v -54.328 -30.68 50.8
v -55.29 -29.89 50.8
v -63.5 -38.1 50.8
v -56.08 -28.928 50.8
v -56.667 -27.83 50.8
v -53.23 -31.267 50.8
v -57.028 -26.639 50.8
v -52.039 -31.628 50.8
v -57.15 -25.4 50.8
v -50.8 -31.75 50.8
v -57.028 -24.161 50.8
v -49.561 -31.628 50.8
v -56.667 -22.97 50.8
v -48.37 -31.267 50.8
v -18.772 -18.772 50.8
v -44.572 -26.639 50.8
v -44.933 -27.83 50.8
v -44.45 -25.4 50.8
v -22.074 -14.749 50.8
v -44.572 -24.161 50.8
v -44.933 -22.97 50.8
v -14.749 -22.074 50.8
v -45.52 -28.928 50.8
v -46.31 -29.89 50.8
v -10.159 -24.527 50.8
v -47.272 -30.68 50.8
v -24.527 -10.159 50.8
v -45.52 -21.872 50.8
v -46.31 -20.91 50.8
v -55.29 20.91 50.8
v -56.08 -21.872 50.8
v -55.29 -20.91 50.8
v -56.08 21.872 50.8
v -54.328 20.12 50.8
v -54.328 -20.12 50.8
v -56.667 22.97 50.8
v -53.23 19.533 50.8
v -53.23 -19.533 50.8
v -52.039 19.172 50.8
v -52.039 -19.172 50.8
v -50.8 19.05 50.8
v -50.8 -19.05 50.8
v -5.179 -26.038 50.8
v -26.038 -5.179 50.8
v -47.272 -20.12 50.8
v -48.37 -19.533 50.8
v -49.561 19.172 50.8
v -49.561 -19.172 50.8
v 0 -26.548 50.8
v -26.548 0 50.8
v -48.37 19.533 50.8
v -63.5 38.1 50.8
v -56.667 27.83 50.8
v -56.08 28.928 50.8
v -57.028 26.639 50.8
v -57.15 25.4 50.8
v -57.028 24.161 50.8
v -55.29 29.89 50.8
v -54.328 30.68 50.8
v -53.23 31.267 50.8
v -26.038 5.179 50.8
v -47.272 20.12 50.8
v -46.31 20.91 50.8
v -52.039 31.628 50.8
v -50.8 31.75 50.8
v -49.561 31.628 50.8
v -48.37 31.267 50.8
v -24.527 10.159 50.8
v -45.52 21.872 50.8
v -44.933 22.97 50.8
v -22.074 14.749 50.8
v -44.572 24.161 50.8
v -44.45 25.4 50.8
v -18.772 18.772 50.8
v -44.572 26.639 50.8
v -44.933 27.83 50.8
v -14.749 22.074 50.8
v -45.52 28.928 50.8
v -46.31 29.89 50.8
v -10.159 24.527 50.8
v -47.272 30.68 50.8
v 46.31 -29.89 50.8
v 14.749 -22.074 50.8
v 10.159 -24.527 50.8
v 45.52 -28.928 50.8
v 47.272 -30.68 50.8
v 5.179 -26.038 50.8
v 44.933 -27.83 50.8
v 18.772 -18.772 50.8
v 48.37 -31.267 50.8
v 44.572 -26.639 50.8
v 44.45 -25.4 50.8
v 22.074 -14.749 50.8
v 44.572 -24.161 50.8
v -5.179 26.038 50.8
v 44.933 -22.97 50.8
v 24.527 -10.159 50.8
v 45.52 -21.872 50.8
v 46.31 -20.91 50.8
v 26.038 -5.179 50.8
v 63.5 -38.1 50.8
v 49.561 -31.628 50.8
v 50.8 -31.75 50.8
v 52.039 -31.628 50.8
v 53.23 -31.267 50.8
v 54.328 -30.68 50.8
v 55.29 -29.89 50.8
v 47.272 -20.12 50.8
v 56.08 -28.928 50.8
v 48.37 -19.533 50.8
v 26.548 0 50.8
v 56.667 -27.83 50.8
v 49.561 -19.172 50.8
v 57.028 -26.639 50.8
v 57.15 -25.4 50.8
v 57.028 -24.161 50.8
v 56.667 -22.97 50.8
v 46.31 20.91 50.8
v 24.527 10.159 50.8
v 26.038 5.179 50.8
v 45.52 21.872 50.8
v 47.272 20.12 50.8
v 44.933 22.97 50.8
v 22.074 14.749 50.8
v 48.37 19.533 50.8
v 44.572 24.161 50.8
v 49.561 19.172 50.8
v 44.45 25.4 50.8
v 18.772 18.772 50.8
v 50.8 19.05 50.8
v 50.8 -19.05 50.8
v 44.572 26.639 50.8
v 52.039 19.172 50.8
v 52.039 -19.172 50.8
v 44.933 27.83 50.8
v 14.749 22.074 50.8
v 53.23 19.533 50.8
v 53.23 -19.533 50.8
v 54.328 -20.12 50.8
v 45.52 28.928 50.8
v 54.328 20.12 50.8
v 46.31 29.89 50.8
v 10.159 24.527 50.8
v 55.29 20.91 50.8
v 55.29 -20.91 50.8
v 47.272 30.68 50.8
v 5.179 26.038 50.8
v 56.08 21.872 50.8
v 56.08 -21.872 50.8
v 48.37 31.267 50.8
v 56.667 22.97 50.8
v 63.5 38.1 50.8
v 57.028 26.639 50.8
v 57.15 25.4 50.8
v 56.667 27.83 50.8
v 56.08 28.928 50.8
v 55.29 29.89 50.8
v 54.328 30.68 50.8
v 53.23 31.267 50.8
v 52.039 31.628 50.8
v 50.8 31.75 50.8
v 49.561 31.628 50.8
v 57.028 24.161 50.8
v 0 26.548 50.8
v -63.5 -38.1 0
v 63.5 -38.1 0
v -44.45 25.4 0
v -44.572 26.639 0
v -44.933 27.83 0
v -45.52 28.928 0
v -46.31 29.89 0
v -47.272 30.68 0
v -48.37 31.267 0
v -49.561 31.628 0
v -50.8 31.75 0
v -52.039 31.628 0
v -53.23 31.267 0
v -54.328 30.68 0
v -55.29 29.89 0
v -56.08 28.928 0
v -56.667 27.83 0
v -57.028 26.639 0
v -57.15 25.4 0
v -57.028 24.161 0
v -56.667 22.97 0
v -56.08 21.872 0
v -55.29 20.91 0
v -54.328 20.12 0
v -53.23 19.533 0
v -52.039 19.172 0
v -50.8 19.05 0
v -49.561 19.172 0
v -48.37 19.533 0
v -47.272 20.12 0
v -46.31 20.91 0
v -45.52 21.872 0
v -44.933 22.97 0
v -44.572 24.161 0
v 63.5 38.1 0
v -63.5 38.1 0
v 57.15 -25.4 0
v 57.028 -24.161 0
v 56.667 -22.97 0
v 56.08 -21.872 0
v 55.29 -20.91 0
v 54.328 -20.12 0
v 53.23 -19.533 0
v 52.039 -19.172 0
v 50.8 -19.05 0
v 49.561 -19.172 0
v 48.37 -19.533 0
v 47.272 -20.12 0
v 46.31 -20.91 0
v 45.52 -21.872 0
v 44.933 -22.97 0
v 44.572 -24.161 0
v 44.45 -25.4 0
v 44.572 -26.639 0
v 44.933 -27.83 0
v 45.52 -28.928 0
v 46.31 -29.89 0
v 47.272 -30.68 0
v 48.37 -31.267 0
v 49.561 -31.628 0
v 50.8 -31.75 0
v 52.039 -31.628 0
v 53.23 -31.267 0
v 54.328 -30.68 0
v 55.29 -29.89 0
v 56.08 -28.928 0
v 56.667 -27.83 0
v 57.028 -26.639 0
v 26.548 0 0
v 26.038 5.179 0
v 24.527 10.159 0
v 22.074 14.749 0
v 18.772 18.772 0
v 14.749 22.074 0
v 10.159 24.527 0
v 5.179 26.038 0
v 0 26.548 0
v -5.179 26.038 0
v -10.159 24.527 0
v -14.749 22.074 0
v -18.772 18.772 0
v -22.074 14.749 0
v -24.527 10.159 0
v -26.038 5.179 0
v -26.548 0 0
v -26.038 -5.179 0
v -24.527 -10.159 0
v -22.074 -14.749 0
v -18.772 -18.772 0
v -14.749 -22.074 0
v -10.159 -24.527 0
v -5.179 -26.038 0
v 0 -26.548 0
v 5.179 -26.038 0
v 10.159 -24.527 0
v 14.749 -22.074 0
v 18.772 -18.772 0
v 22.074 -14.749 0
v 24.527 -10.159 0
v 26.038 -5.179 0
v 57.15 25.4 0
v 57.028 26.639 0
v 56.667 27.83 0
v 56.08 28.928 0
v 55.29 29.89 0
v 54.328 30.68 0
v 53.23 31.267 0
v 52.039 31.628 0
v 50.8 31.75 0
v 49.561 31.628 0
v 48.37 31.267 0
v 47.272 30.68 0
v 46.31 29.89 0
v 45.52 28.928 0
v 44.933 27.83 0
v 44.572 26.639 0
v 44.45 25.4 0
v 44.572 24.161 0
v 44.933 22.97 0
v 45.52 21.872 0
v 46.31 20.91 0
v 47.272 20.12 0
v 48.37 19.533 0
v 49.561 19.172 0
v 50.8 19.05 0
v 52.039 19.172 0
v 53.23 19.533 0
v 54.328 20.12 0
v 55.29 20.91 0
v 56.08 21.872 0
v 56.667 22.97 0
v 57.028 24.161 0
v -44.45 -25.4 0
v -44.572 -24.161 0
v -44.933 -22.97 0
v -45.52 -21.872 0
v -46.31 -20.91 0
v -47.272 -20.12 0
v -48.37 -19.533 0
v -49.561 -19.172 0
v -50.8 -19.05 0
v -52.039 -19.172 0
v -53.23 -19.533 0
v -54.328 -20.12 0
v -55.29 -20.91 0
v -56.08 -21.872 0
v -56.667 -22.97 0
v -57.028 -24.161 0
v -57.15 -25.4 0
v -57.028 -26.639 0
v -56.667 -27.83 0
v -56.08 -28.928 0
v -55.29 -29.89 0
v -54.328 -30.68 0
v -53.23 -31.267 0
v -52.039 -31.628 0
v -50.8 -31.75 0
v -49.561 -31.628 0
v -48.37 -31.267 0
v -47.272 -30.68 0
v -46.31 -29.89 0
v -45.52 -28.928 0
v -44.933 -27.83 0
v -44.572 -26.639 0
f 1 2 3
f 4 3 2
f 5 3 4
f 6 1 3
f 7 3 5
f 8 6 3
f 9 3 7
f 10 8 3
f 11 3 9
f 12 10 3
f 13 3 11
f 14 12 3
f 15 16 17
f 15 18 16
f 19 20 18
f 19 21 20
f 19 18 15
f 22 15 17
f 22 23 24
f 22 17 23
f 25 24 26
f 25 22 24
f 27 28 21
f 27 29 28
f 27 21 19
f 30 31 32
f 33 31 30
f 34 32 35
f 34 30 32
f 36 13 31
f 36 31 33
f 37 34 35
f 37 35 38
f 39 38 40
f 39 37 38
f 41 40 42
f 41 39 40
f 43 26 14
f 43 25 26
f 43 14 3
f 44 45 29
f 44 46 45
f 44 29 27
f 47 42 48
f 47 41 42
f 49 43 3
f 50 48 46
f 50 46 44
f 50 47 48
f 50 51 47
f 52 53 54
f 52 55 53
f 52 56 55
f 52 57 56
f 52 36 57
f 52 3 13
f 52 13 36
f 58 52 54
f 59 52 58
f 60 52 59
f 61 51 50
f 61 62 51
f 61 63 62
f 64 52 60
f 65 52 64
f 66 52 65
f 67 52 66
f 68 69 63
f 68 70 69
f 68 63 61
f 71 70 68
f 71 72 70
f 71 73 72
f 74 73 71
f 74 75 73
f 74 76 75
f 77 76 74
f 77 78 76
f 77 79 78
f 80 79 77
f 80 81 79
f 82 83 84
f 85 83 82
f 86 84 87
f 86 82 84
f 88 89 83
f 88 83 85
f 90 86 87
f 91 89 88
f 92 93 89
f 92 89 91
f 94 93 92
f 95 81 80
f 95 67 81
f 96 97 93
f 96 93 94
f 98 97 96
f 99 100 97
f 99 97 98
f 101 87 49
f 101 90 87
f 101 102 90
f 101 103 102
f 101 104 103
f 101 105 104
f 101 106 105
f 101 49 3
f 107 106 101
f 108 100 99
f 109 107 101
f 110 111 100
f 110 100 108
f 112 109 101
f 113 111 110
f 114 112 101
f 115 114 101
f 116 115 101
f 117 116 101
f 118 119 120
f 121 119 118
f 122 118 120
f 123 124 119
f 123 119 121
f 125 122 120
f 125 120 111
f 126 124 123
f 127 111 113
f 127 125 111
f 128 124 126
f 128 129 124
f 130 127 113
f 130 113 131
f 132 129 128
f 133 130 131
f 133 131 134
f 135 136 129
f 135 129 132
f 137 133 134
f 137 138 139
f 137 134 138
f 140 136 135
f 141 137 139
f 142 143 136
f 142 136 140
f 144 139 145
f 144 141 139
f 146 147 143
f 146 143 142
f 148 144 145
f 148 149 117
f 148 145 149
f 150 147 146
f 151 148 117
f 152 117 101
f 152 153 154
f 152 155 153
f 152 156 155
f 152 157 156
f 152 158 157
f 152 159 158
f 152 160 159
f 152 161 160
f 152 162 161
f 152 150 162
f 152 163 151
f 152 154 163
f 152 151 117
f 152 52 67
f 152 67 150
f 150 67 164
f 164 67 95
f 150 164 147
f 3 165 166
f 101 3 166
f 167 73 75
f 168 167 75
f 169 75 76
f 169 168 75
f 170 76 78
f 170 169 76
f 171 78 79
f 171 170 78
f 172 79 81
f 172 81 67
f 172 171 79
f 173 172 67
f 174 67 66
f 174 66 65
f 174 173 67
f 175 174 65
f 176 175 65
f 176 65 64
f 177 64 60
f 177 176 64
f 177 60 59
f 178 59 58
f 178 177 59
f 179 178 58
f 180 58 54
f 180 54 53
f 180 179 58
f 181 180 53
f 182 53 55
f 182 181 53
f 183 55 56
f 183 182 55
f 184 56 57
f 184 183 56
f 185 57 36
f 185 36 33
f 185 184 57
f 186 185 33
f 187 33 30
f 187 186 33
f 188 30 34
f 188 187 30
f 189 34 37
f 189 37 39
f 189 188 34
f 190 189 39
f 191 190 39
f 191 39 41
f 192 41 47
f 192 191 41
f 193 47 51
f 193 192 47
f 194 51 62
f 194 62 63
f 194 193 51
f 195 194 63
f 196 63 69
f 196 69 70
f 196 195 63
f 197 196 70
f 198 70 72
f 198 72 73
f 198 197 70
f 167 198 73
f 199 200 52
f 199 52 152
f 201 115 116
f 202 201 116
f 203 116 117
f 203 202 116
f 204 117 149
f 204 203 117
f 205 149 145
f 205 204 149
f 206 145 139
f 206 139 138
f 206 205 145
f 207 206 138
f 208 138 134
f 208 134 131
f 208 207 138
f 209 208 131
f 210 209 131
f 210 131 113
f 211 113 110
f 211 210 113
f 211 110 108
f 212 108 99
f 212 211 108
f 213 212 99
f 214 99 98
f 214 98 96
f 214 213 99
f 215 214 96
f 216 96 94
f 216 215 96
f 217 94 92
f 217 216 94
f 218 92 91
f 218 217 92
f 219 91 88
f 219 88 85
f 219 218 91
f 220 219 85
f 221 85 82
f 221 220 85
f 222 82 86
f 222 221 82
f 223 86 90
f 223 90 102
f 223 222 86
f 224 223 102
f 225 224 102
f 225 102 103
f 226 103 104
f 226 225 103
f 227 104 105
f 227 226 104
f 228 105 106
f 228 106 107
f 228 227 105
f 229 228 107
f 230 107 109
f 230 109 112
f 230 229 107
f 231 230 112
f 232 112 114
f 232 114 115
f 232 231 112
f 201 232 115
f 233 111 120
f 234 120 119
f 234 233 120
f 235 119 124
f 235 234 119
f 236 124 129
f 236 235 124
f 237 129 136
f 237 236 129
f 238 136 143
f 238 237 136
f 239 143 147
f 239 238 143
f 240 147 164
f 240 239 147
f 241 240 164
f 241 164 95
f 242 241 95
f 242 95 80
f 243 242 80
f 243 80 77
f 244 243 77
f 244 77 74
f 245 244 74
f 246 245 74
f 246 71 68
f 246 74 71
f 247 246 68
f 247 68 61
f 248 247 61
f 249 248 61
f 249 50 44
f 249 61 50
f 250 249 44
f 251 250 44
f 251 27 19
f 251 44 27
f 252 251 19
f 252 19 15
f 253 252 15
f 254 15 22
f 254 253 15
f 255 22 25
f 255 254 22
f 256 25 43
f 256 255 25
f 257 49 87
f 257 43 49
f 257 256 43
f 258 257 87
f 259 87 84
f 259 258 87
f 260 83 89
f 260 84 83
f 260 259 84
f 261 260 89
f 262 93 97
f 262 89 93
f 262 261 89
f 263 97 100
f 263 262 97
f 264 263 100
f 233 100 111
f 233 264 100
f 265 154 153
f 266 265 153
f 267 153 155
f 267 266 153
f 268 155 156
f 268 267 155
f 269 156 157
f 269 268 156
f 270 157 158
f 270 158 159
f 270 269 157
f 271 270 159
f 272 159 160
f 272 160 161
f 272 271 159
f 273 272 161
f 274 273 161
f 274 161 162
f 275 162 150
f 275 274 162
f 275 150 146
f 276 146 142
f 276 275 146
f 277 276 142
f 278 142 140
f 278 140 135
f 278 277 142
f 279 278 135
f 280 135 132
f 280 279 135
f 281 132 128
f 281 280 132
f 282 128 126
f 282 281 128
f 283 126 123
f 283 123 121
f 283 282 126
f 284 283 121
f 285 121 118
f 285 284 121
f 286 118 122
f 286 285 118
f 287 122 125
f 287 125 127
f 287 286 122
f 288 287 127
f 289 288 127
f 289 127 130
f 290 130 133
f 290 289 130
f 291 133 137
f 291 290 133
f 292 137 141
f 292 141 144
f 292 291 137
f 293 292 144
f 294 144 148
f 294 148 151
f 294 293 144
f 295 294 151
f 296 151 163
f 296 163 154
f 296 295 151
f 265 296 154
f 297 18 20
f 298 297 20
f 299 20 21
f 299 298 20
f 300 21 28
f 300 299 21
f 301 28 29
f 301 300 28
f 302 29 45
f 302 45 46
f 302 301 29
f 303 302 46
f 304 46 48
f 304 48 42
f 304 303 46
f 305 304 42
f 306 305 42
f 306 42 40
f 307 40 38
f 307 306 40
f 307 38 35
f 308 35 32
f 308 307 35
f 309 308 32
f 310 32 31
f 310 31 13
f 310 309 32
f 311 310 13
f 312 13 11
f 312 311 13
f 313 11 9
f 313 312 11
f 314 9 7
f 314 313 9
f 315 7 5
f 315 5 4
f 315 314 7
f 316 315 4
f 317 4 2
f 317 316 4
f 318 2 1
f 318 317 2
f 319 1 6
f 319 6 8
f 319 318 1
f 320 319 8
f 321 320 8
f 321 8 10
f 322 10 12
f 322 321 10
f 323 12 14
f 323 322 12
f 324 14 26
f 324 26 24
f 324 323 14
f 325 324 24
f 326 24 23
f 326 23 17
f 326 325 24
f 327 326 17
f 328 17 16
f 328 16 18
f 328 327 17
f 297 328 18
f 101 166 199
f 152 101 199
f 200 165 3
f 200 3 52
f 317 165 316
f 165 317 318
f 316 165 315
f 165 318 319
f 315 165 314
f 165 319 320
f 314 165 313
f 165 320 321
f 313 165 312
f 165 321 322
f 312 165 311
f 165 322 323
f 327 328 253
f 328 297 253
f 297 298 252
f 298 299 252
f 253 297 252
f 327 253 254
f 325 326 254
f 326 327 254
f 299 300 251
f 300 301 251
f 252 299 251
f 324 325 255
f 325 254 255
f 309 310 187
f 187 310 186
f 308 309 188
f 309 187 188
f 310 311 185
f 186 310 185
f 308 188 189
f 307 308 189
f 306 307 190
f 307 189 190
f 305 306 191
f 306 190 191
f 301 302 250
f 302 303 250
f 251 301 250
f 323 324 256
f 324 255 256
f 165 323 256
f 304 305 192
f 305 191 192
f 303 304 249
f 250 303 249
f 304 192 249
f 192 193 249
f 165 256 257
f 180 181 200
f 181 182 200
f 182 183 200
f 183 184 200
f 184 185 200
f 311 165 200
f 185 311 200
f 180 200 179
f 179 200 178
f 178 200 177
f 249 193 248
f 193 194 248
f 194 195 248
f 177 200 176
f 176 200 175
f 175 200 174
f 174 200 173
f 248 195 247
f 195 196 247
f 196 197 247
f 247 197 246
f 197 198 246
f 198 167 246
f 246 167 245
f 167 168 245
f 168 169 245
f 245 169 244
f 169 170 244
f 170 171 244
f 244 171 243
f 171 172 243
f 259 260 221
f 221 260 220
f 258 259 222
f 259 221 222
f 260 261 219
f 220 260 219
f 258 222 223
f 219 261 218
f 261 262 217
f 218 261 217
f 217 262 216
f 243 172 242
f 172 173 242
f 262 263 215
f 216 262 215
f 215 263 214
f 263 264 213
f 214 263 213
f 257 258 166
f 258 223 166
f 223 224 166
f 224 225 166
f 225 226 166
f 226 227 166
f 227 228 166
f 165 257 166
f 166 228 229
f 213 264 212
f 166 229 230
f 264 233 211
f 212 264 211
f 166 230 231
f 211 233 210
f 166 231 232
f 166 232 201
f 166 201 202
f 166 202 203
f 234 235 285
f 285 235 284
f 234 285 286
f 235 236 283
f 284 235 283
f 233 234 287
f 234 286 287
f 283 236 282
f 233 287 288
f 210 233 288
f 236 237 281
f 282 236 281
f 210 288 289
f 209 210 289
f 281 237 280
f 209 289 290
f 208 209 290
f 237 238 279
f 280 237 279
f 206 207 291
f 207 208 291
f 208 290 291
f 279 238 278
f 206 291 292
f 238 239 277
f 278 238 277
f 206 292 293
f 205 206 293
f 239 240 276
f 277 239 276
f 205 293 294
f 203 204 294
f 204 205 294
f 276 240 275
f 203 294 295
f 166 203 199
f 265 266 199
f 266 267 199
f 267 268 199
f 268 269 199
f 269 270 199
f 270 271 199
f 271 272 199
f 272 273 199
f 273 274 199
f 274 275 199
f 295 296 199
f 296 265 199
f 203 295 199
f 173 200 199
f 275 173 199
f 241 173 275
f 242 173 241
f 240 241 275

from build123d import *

# Parameters (mm, degrees)
F0_W     = 127
F0_H     = 76.2
F0_R     = 6.35
F1_DEPTH = 50.8
F2_R     = 26.547784
F3_DEPTH = 50.801


with BuildPart() as f1:
    # F0 (on Top) → F1 (new body)
    with BuildSketch(Plane.XY):
        Rectangle(F0_W, F0_H)
        with Locations((-50.8, -25.4)):
            Circle(F0_R, mode=Mode.SUBTRACT)
        with Locations((50.8, -25.4)):
            Circle(F0_R, mode=Mode.SUBTRACT)
        with Locations((-50.8, 25.4)):
            Circle(F0_R, mode=Mode.SUBTRACT)
        with Locations((50.8, 25.4)):
            Circle(F0_R, mode=Mode.SUBTRACT)
    extrude(amount=F1_DEPTH)

    # F2 (on Top) → F3 (cut, through all)
    with BuildSketch(Plane.XY):
        Circle(F2_R)
    extrude(amount=F3_DEPTH, mode=Mode.SUBTRACT)


solid = f1.part
